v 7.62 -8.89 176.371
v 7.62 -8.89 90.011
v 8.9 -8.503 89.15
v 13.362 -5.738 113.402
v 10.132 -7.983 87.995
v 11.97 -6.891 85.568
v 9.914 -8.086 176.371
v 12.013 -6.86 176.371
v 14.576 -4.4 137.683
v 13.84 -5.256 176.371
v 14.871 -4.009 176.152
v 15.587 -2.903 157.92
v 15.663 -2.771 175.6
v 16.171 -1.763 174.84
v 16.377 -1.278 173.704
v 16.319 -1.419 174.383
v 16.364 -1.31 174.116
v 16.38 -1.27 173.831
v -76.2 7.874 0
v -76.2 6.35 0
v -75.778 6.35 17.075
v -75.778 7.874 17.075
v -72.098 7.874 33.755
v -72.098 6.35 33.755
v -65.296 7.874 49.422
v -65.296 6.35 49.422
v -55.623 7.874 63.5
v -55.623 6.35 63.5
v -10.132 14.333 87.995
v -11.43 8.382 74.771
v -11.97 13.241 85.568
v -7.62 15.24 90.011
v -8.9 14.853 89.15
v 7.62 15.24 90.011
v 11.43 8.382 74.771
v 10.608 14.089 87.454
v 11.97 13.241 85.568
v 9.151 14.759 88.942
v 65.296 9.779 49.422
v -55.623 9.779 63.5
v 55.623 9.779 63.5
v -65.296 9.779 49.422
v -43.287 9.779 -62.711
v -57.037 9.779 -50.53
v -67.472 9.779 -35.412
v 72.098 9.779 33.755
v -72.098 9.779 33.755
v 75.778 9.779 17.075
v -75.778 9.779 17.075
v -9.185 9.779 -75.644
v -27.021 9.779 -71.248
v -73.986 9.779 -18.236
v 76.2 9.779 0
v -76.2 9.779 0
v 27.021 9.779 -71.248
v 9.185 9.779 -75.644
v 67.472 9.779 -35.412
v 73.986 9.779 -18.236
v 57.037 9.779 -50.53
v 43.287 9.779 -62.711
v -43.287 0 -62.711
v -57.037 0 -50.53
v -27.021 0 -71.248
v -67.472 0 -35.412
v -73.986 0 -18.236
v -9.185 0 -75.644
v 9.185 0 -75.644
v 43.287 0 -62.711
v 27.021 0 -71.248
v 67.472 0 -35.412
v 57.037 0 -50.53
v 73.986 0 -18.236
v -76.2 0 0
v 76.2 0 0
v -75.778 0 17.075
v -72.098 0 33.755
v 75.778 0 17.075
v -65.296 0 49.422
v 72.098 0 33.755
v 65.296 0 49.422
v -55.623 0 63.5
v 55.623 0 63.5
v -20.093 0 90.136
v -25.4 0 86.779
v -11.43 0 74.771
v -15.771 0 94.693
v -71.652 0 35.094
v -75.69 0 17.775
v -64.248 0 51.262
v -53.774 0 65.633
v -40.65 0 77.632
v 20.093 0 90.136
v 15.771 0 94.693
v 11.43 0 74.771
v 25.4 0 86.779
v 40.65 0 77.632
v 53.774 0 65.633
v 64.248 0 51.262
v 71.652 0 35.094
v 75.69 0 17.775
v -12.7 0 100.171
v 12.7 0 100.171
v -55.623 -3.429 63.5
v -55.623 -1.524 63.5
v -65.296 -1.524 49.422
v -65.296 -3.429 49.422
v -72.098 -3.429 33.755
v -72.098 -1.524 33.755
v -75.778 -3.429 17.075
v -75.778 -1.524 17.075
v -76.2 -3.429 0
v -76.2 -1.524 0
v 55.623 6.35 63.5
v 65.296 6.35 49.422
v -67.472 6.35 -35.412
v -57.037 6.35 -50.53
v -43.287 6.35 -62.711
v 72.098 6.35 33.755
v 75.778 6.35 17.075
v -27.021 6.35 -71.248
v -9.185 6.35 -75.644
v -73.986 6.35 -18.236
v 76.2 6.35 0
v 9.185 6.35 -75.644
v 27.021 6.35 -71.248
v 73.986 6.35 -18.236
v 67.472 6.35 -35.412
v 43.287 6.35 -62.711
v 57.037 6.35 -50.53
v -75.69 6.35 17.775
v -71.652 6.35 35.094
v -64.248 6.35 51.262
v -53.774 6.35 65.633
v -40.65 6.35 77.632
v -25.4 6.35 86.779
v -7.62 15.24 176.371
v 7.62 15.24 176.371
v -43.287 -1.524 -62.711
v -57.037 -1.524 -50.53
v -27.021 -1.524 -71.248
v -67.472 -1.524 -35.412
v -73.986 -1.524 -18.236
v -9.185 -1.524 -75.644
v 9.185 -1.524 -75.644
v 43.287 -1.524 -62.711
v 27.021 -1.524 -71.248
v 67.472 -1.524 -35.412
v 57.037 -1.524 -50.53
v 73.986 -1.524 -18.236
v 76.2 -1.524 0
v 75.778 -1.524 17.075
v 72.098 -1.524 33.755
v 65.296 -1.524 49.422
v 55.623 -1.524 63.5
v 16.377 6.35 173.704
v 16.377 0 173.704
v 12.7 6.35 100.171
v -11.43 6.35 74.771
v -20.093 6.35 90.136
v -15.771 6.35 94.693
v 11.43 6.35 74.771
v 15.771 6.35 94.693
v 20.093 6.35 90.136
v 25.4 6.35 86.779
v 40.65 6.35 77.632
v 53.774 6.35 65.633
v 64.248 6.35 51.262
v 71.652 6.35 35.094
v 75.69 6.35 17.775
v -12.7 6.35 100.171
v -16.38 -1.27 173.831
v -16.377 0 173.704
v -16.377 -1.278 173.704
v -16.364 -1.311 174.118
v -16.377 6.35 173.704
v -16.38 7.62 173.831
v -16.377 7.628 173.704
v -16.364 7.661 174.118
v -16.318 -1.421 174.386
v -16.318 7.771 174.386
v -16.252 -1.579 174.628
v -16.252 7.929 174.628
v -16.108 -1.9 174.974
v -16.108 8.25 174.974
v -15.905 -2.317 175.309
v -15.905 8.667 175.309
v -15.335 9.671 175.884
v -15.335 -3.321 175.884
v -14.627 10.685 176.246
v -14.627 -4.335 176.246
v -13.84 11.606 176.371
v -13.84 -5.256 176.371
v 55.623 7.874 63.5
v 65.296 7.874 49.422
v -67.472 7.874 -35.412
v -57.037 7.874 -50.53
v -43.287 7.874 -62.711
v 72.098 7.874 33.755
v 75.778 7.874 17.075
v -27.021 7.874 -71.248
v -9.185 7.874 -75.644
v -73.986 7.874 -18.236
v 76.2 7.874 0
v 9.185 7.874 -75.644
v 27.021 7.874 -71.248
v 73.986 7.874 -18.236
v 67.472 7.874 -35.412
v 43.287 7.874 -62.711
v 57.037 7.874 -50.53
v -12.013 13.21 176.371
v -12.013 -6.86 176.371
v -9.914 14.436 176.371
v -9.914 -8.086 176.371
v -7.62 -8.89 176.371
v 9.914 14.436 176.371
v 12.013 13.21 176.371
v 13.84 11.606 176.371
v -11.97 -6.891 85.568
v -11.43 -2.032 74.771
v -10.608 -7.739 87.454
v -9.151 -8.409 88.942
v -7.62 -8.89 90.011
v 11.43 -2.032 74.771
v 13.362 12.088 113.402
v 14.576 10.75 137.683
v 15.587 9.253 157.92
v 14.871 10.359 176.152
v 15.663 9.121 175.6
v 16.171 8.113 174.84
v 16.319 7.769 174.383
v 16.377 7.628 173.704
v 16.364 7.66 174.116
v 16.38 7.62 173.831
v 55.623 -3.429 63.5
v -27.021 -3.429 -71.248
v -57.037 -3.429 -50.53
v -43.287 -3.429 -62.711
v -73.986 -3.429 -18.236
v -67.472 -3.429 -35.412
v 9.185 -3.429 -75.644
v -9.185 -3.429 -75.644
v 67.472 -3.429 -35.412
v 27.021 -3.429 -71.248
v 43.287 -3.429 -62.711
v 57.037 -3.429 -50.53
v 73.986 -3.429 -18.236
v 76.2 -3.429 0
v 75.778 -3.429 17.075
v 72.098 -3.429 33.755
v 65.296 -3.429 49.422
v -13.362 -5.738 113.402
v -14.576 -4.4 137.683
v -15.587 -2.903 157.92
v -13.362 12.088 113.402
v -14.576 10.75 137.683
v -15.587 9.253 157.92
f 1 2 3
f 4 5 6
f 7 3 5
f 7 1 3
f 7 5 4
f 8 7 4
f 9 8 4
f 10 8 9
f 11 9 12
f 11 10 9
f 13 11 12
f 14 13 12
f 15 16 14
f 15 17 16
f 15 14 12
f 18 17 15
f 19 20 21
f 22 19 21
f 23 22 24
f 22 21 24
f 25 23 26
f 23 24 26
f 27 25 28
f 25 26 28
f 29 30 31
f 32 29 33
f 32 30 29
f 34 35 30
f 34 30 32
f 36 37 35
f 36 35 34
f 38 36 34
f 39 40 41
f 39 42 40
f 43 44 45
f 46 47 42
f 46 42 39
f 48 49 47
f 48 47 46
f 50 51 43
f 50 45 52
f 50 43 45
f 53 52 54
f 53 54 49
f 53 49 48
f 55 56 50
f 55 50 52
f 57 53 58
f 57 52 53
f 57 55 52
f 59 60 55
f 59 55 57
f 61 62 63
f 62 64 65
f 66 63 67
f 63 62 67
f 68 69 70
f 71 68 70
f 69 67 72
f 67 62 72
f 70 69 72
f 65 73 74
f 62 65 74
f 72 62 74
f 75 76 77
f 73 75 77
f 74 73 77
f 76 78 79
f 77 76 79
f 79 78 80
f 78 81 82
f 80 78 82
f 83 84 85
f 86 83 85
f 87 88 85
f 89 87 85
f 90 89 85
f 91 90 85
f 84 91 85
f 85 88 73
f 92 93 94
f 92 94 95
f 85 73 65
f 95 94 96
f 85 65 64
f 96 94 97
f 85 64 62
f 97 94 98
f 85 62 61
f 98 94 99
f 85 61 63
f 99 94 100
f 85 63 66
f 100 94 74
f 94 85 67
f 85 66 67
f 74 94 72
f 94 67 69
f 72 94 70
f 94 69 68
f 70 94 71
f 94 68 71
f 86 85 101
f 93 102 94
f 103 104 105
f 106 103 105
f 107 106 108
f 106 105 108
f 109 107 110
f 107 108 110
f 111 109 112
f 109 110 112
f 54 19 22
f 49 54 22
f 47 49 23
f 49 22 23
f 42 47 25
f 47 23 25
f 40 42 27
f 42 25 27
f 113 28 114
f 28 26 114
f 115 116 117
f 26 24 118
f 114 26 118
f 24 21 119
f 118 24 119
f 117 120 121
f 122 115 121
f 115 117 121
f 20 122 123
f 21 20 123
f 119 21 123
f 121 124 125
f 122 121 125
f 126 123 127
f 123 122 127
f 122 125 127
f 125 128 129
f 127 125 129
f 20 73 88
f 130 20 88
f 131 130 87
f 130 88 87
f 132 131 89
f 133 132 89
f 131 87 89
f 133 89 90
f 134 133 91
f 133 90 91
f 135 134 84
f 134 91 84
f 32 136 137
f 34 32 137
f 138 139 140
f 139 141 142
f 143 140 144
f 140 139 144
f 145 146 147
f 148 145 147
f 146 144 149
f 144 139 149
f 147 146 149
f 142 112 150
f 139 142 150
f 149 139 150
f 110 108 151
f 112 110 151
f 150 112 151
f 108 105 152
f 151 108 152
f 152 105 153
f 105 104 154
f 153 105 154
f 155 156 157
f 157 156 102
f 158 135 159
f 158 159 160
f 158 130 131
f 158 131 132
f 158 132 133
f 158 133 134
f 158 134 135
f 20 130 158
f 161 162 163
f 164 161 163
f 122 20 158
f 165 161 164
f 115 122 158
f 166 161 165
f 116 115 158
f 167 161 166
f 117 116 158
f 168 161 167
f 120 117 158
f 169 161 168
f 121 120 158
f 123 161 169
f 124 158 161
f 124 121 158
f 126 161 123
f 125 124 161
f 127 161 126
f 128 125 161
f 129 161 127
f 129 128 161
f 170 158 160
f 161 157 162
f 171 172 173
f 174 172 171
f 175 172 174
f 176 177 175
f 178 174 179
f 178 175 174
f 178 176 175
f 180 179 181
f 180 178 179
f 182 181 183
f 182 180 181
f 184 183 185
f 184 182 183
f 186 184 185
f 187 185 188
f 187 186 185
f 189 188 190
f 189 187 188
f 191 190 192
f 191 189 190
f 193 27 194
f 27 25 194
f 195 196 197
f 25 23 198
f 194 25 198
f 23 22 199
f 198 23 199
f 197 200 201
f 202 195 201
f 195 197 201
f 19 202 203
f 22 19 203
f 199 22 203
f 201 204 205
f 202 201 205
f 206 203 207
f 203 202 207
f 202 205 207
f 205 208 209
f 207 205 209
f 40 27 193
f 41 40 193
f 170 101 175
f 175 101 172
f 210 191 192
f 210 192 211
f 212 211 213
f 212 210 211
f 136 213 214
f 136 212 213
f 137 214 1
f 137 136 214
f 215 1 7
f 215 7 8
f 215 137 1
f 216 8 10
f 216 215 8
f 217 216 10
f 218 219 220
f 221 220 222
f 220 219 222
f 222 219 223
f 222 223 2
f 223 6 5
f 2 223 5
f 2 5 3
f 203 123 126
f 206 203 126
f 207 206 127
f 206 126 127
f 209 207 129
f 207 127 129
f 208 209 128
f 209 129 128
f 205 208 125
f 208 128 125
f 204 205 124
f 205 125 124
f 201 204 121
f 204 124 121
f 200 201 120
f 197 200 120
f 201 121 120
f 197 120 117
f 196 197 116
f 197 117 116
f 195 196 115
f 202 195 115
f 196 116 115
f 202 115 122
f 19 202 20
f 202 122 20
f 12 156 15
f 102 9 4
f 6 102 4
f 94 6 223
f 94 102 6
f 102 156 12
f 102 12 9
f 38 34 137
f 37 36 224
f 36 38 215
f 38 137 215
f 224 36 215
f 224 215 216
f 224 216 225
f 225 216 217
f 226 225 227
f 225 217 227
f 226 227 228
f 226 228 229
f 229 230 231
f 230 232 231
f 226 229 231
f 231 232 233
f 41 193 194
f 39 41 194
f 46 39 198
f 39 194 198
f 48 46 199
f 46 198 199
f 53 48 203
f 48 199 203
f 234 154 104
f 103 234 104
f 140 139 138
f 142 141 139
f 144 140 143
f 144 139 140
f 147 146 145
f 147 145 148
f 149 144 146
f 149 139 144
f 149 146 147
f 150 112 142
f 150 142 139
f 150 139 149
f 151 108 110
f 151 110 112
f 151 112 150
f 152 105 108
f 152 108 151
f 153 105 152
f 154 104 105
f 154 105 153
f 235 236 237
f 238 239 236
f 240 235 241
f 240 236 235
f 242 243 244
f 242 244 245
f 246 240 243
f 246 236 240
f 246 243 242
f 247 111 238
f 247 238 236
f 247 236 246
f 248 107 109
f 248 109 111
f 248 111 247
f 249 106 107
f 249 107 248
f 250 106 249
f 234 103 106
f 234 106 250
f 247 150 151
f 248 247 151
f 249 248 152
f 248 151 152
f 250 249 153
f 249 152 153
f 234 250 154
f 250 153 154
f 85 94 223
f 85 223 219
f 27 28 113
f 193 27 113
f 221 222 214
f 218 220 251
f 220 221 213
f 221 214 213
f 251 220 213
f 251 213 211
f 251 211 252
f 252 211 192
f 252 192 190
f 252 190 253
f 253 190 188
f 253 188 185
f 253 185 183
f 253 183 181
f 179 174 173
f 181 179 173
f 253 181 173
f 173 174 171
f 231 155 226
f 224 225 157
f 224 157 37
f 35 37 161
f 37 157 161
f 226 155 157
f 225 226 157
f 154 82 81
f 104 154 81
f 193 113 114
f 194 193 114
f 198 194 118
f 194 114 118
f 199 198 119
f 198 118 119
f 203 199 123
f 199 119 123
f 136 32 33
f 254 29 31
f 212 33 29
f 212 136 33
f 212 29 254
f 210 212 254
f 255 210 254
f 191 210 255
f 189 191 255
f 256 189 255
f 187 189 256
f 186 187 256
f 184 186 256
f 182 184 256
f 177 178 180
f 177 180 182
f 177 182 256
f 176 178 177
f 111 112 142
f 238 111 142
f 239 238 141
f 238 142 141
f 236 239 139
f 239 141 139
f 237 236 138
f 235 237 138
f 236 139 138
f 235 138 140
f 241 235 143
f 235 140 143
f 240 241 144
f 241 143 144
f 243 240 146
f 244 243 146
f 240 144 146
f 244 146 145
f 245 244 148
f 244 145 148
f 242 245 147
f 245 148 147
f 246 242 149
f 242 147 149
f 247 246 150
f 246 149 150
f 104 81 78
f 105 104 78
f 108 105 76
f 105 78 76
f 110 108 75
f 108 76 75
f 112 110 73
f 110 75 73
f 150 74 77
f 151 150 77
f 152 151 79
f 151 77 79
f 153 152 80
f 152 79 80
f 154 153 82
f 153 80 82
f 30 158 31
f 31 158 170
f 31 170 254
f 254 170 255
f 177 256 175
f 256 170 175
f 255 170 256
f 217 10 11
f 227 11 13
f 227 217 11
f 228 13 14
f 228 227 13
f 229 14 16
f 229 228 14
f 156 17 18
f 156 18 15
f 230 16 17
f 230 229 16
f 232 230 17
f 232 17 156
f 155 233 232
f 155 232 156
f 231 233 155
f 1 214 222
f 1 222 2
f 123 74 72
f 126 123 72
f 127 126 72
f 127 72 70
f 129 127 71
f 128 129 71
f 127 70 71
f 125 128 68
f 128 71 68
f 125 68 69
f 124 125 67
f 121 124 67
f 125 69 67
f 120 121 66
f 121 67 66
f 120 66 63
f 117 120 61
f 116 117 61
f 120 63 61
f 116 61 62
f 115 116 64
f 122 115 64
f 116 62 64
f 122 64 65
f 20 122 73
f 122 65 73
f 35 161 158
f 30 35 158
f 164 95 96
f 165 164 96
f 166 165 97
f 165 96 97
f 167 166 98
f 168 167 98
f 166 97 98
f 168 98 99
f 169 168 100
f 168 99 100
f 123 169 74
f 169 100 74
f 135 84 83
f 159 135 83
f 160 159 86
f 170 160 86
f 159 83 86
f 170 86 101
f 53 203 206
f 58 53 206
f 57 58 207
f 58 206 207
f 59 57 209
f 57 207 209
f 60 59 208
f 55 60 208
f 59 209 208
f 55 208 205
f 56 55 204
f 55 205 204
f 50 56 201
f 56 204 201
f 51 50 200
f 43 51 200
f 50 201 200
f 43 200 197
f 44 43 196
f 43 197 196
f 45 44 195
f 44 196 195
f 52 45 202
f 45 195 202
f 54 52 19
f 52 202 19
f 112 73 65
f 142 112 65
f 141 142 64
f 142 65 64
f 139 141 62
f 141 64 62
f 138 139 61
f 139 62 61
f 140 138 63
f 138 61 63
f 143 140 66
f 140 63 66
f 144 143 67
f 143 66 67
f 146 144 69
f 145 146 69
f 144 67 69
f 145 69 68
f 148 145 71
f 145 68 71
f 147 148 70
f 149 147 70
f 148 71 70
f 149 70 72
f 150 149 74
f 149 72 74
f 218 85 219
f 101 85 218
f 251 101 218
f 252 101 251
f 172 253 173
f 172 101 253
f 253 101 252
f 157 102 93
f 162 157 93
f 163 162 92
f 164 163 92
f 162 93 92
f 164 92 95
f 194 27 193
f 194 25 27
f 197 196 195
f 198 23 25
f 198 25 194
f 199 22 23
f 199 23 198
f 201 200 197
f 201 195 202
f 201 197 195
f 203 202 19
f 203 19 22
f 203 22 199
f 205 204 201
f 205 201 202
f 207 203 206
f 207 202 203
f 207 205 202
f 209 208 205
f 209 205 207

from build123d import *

# Parameters (mm, degrees)
BOSS_EXTRUDE1_DEPTH = 6.35
BOSS_EXTRUDE2_DEPTH = 1.524
BOSS_EXTRUDE4_DEPTH = 1.905
BOSS_EXTRUDE5_DEPTH = 1.524
BOSS_EXTRUDE6_DEPTH = 1.905
BOSS_EXTRUDE7_DEPTH = 8.89
CUT_EXTRUDE1_DEPTH  = 101.6
CUT_EXTRUDE2_DEPTH  = 25.4


with BuildPart() as part:
    # Sketch2 → Boss-Extrude1 (new body)
    with BuildSketch(Plane(origin=(0, 0, 0), x_dir=(1, 0, 0), z_dir=(0, 1, 0))):
        with BuildLine():
            Line((-12.7, -100.170905775), (-16.376657923, -173.704064228))
            ThreePointArc((-16.376657923, -173.704064228), (-15.680177156, -175.581537443), (-13.839826982, -176.370905775))
            Line((-13.839826982, -176.370905775), (13.839826982, -176.370905775))
            ThreePointArc((13.839826982, -176.370905775), (15.680177156, -175.581537443), (16.376657923, -173.704064228))
            Line((16.376657923, -173.704064228), (12.7, -100.170905775))
            ThreePointArc((12.7, -100.170905775), (17.790636658, -92.280726172), (25.4, -86.779171366))
            ThreePointArc((25.4, -86.779171366), (64.24812298, -51.26203522), (76.2, 0))
            ThreePointArc((76.2, 0), (0, 76.2), (-76.2, 0))
            ThreePointArc((-76.2, 0), (-64.24812298, -51.26203522), (-25.4, -86.779171366))
            ThreePointArc((-25.4, -86.779171366), (-17.790636658, -92.280726172), (-12.7, -100.170905775))
        make_face()
    extrude(amount=BOSS_EXTRUDE1_DEPTH)

    # Sketch7 → Boss-Extrude7 (add)
    with BuildSketch(Plane(origin=(0, 6.35, 0), x_dir=(1, 0, 0), z_dir=(0, 1, 0))):
        with BuildLine():
            Line((-11.43, -74.770905775), (-16.376657923, -173.704064228))
            ThreePointArc((-16.376657923, -173.704064228), (-15.680177156, -175.581537443), (-13.839826982, -176.370905775))
            Line((-13.839826982, -176.370905775), (13.839826982, -176.370905775))
            ThreePointArc((13.839826982, -176.370905775), (15.680177156, -175.581537443), (16.376657923, -173.704064228))
            Line((16.376657923, -173.704064228), (11.43, -74.770905775))
            Line((11.43, -74.770905775), (-11.43, -74.770905775))
        make_face()
    boss_extrude7 = extrude(amount=BOSS_EXTRUDE7_DEPTH)

    # Sketch8 → Cut-Extrude1 (cut)
    with BuildSketch(Plane.XY.offset(176.370905775)):
        with BuildLine():
            Line((-13.839826982, 15.24), (-7.62, 15.24))
            ThreePointArc((-7.62, 15.24), (-12.921650252, 12.489613458), (-16.379826982, 7.62))
            Line((-16.379826982, 7.62), (-16.379826982, 15.24))
            Line((-16.379826982, 15.24), (-13.839826982, 15.24))
        make_face()
        with BuildLine():
            Line((16.379826982, 15.24), (13.839826982, 15.24))
            Line((13.839826982, 15.24), (7.62, 15.24))
            ThreePointArc((7.62, 15.24), (12.921650252, 12.489613458), (16.379826982, 7.62))
            Line((16.379826982, 7.62), (16.379826982, 15.24))
        make_face()
    cut_extrude1 = extrude(amount=-CUT_EXTRUDE1_DEPTH, mode=Mode.SUBTRACT)

    # Sketch9 → Cut-Extrude2 (cut, symmetric)
    with BuildSketch(Plane(origin=(0, 0, -0.19192658), x_dir=(0, 0, -1), z_dir=(1, 0, 0))):
        Polygon((-74.962832355, 8.382), (-90.202832355, 15.24), (-74.962832355, 15.24), align=None)
    cut_extrude2 = extrude(amount=CUT_EXTRUDE2_DEPTH, both=True, mode=Mode.SUBTRACT)

    # Mirror8: Boss-Extrude7, Cut-Extrude1, Cut-Extrude2 across plane
    add(boss_extrude7.mirror(Plane.ZX.offset(3.175)))
    add(cut_extrude1.mirror(Plane.ZX.offset(3.175)), mode=Mode.SUBTRACT)
    add(cut_extrude2.mirror(Plane.ZX.offset(3.175)), mode=Mode.SUBTRACT)


with BuildPart() as body_2:
    # Sketch3 → Boss-Extrude2 (new body)
    with BuildSketch(Plane(origin=(0, 6.35, 0), x_dir=(1, 0, 0), z_dir=(0, 1, 0))):
        with BuildLine():
            Line((-55.623239344, -63.5), (55.623239344, -63.5))
            ThreePointArc((55.623239344, -63.5), (72.09775167, -33.754575709), (76.2, 0))
            ThreePointArc((76.2, 0), (0, 76.2), (-76.2, 0))
            ThreePointArc((-76.2, 0), (-72.09775167, -33.754575709), (-55.623239344, -63.5))
        make_face()
    extrude(amount=BOSS_EXTRUDE2_DEPTH)


with BuildPart() as body_3:
    # Sketch4 → Boss-Extrude4 (new body)
    with BuildSketch(Plane(origin=(0, 7.874, 0), x_dir=(1, 0, 0), z_dir=(0, 1, 0))):
        with BuildLine():
            Line((-55.623239344, -63.5), (55.623239344, -63.5))
            ThreePointArc((55.623239344, -63.5), (72.09775167, -33.754575709), (76.2, 0))
            ThreePointArc((76.2, 0), (0, 76.2), (-76.2, 0))
            ThreePointArc((-76.2, 0), (-72.09775167, -33.754575709), (-55.623239344, -63.5))
        make_face()
    extrude(amount=BOSS_EXTRUDE4_DEPTH)


with BuildPart() as body_4:
    # Sketch5 → Boss-Extrude5 (new body)
    with BuildSketch(Plane.XZ):
        with BuildLine():
            Line((55.623239344, 63.5), (-55.623239344, 63.5))
            ThreePointArc((-55.623239344, 63.5), (-72.09775167, 33.754575709), (-76.2, 0))
            ThreePointArc((-76.2, 0), (0, -76.2), (76.2, 0))
            ThreePointArc((76.2, 0), (72.09775167, 33.754575709), (55.623239344, 63.5))
        make_face()
    extrude(amount=BOSS_EXTRUDE5_DEPTH)


with BuildPart() as body_5:
    # Sketch6 → Boss-Extrude6 (new body)
    with BuildSketch(Plane.XZ.offset(1.524)):
        with BuildLine():
            Line((55.623239344, 63.5), (-55.623239344, 63.5))
            ThreePointArc((-55.623239344, 63.5), (-72.09775167, 33.754575709), (-76.2, 0))
            ThreePointArc((-76.2, 0), (0, -76.2), (76.2, 0))
            ThreePointArc((76.2, 0), (72.09775167, 33.754575709), (55.623239344, 63.5))
        make_face()
    extrude(amount=BOSS_EXTRUDE6_DEPTH)


solid = Compound([part.part, body_2.part, body_3.part, body_4.part, body_5.part])
